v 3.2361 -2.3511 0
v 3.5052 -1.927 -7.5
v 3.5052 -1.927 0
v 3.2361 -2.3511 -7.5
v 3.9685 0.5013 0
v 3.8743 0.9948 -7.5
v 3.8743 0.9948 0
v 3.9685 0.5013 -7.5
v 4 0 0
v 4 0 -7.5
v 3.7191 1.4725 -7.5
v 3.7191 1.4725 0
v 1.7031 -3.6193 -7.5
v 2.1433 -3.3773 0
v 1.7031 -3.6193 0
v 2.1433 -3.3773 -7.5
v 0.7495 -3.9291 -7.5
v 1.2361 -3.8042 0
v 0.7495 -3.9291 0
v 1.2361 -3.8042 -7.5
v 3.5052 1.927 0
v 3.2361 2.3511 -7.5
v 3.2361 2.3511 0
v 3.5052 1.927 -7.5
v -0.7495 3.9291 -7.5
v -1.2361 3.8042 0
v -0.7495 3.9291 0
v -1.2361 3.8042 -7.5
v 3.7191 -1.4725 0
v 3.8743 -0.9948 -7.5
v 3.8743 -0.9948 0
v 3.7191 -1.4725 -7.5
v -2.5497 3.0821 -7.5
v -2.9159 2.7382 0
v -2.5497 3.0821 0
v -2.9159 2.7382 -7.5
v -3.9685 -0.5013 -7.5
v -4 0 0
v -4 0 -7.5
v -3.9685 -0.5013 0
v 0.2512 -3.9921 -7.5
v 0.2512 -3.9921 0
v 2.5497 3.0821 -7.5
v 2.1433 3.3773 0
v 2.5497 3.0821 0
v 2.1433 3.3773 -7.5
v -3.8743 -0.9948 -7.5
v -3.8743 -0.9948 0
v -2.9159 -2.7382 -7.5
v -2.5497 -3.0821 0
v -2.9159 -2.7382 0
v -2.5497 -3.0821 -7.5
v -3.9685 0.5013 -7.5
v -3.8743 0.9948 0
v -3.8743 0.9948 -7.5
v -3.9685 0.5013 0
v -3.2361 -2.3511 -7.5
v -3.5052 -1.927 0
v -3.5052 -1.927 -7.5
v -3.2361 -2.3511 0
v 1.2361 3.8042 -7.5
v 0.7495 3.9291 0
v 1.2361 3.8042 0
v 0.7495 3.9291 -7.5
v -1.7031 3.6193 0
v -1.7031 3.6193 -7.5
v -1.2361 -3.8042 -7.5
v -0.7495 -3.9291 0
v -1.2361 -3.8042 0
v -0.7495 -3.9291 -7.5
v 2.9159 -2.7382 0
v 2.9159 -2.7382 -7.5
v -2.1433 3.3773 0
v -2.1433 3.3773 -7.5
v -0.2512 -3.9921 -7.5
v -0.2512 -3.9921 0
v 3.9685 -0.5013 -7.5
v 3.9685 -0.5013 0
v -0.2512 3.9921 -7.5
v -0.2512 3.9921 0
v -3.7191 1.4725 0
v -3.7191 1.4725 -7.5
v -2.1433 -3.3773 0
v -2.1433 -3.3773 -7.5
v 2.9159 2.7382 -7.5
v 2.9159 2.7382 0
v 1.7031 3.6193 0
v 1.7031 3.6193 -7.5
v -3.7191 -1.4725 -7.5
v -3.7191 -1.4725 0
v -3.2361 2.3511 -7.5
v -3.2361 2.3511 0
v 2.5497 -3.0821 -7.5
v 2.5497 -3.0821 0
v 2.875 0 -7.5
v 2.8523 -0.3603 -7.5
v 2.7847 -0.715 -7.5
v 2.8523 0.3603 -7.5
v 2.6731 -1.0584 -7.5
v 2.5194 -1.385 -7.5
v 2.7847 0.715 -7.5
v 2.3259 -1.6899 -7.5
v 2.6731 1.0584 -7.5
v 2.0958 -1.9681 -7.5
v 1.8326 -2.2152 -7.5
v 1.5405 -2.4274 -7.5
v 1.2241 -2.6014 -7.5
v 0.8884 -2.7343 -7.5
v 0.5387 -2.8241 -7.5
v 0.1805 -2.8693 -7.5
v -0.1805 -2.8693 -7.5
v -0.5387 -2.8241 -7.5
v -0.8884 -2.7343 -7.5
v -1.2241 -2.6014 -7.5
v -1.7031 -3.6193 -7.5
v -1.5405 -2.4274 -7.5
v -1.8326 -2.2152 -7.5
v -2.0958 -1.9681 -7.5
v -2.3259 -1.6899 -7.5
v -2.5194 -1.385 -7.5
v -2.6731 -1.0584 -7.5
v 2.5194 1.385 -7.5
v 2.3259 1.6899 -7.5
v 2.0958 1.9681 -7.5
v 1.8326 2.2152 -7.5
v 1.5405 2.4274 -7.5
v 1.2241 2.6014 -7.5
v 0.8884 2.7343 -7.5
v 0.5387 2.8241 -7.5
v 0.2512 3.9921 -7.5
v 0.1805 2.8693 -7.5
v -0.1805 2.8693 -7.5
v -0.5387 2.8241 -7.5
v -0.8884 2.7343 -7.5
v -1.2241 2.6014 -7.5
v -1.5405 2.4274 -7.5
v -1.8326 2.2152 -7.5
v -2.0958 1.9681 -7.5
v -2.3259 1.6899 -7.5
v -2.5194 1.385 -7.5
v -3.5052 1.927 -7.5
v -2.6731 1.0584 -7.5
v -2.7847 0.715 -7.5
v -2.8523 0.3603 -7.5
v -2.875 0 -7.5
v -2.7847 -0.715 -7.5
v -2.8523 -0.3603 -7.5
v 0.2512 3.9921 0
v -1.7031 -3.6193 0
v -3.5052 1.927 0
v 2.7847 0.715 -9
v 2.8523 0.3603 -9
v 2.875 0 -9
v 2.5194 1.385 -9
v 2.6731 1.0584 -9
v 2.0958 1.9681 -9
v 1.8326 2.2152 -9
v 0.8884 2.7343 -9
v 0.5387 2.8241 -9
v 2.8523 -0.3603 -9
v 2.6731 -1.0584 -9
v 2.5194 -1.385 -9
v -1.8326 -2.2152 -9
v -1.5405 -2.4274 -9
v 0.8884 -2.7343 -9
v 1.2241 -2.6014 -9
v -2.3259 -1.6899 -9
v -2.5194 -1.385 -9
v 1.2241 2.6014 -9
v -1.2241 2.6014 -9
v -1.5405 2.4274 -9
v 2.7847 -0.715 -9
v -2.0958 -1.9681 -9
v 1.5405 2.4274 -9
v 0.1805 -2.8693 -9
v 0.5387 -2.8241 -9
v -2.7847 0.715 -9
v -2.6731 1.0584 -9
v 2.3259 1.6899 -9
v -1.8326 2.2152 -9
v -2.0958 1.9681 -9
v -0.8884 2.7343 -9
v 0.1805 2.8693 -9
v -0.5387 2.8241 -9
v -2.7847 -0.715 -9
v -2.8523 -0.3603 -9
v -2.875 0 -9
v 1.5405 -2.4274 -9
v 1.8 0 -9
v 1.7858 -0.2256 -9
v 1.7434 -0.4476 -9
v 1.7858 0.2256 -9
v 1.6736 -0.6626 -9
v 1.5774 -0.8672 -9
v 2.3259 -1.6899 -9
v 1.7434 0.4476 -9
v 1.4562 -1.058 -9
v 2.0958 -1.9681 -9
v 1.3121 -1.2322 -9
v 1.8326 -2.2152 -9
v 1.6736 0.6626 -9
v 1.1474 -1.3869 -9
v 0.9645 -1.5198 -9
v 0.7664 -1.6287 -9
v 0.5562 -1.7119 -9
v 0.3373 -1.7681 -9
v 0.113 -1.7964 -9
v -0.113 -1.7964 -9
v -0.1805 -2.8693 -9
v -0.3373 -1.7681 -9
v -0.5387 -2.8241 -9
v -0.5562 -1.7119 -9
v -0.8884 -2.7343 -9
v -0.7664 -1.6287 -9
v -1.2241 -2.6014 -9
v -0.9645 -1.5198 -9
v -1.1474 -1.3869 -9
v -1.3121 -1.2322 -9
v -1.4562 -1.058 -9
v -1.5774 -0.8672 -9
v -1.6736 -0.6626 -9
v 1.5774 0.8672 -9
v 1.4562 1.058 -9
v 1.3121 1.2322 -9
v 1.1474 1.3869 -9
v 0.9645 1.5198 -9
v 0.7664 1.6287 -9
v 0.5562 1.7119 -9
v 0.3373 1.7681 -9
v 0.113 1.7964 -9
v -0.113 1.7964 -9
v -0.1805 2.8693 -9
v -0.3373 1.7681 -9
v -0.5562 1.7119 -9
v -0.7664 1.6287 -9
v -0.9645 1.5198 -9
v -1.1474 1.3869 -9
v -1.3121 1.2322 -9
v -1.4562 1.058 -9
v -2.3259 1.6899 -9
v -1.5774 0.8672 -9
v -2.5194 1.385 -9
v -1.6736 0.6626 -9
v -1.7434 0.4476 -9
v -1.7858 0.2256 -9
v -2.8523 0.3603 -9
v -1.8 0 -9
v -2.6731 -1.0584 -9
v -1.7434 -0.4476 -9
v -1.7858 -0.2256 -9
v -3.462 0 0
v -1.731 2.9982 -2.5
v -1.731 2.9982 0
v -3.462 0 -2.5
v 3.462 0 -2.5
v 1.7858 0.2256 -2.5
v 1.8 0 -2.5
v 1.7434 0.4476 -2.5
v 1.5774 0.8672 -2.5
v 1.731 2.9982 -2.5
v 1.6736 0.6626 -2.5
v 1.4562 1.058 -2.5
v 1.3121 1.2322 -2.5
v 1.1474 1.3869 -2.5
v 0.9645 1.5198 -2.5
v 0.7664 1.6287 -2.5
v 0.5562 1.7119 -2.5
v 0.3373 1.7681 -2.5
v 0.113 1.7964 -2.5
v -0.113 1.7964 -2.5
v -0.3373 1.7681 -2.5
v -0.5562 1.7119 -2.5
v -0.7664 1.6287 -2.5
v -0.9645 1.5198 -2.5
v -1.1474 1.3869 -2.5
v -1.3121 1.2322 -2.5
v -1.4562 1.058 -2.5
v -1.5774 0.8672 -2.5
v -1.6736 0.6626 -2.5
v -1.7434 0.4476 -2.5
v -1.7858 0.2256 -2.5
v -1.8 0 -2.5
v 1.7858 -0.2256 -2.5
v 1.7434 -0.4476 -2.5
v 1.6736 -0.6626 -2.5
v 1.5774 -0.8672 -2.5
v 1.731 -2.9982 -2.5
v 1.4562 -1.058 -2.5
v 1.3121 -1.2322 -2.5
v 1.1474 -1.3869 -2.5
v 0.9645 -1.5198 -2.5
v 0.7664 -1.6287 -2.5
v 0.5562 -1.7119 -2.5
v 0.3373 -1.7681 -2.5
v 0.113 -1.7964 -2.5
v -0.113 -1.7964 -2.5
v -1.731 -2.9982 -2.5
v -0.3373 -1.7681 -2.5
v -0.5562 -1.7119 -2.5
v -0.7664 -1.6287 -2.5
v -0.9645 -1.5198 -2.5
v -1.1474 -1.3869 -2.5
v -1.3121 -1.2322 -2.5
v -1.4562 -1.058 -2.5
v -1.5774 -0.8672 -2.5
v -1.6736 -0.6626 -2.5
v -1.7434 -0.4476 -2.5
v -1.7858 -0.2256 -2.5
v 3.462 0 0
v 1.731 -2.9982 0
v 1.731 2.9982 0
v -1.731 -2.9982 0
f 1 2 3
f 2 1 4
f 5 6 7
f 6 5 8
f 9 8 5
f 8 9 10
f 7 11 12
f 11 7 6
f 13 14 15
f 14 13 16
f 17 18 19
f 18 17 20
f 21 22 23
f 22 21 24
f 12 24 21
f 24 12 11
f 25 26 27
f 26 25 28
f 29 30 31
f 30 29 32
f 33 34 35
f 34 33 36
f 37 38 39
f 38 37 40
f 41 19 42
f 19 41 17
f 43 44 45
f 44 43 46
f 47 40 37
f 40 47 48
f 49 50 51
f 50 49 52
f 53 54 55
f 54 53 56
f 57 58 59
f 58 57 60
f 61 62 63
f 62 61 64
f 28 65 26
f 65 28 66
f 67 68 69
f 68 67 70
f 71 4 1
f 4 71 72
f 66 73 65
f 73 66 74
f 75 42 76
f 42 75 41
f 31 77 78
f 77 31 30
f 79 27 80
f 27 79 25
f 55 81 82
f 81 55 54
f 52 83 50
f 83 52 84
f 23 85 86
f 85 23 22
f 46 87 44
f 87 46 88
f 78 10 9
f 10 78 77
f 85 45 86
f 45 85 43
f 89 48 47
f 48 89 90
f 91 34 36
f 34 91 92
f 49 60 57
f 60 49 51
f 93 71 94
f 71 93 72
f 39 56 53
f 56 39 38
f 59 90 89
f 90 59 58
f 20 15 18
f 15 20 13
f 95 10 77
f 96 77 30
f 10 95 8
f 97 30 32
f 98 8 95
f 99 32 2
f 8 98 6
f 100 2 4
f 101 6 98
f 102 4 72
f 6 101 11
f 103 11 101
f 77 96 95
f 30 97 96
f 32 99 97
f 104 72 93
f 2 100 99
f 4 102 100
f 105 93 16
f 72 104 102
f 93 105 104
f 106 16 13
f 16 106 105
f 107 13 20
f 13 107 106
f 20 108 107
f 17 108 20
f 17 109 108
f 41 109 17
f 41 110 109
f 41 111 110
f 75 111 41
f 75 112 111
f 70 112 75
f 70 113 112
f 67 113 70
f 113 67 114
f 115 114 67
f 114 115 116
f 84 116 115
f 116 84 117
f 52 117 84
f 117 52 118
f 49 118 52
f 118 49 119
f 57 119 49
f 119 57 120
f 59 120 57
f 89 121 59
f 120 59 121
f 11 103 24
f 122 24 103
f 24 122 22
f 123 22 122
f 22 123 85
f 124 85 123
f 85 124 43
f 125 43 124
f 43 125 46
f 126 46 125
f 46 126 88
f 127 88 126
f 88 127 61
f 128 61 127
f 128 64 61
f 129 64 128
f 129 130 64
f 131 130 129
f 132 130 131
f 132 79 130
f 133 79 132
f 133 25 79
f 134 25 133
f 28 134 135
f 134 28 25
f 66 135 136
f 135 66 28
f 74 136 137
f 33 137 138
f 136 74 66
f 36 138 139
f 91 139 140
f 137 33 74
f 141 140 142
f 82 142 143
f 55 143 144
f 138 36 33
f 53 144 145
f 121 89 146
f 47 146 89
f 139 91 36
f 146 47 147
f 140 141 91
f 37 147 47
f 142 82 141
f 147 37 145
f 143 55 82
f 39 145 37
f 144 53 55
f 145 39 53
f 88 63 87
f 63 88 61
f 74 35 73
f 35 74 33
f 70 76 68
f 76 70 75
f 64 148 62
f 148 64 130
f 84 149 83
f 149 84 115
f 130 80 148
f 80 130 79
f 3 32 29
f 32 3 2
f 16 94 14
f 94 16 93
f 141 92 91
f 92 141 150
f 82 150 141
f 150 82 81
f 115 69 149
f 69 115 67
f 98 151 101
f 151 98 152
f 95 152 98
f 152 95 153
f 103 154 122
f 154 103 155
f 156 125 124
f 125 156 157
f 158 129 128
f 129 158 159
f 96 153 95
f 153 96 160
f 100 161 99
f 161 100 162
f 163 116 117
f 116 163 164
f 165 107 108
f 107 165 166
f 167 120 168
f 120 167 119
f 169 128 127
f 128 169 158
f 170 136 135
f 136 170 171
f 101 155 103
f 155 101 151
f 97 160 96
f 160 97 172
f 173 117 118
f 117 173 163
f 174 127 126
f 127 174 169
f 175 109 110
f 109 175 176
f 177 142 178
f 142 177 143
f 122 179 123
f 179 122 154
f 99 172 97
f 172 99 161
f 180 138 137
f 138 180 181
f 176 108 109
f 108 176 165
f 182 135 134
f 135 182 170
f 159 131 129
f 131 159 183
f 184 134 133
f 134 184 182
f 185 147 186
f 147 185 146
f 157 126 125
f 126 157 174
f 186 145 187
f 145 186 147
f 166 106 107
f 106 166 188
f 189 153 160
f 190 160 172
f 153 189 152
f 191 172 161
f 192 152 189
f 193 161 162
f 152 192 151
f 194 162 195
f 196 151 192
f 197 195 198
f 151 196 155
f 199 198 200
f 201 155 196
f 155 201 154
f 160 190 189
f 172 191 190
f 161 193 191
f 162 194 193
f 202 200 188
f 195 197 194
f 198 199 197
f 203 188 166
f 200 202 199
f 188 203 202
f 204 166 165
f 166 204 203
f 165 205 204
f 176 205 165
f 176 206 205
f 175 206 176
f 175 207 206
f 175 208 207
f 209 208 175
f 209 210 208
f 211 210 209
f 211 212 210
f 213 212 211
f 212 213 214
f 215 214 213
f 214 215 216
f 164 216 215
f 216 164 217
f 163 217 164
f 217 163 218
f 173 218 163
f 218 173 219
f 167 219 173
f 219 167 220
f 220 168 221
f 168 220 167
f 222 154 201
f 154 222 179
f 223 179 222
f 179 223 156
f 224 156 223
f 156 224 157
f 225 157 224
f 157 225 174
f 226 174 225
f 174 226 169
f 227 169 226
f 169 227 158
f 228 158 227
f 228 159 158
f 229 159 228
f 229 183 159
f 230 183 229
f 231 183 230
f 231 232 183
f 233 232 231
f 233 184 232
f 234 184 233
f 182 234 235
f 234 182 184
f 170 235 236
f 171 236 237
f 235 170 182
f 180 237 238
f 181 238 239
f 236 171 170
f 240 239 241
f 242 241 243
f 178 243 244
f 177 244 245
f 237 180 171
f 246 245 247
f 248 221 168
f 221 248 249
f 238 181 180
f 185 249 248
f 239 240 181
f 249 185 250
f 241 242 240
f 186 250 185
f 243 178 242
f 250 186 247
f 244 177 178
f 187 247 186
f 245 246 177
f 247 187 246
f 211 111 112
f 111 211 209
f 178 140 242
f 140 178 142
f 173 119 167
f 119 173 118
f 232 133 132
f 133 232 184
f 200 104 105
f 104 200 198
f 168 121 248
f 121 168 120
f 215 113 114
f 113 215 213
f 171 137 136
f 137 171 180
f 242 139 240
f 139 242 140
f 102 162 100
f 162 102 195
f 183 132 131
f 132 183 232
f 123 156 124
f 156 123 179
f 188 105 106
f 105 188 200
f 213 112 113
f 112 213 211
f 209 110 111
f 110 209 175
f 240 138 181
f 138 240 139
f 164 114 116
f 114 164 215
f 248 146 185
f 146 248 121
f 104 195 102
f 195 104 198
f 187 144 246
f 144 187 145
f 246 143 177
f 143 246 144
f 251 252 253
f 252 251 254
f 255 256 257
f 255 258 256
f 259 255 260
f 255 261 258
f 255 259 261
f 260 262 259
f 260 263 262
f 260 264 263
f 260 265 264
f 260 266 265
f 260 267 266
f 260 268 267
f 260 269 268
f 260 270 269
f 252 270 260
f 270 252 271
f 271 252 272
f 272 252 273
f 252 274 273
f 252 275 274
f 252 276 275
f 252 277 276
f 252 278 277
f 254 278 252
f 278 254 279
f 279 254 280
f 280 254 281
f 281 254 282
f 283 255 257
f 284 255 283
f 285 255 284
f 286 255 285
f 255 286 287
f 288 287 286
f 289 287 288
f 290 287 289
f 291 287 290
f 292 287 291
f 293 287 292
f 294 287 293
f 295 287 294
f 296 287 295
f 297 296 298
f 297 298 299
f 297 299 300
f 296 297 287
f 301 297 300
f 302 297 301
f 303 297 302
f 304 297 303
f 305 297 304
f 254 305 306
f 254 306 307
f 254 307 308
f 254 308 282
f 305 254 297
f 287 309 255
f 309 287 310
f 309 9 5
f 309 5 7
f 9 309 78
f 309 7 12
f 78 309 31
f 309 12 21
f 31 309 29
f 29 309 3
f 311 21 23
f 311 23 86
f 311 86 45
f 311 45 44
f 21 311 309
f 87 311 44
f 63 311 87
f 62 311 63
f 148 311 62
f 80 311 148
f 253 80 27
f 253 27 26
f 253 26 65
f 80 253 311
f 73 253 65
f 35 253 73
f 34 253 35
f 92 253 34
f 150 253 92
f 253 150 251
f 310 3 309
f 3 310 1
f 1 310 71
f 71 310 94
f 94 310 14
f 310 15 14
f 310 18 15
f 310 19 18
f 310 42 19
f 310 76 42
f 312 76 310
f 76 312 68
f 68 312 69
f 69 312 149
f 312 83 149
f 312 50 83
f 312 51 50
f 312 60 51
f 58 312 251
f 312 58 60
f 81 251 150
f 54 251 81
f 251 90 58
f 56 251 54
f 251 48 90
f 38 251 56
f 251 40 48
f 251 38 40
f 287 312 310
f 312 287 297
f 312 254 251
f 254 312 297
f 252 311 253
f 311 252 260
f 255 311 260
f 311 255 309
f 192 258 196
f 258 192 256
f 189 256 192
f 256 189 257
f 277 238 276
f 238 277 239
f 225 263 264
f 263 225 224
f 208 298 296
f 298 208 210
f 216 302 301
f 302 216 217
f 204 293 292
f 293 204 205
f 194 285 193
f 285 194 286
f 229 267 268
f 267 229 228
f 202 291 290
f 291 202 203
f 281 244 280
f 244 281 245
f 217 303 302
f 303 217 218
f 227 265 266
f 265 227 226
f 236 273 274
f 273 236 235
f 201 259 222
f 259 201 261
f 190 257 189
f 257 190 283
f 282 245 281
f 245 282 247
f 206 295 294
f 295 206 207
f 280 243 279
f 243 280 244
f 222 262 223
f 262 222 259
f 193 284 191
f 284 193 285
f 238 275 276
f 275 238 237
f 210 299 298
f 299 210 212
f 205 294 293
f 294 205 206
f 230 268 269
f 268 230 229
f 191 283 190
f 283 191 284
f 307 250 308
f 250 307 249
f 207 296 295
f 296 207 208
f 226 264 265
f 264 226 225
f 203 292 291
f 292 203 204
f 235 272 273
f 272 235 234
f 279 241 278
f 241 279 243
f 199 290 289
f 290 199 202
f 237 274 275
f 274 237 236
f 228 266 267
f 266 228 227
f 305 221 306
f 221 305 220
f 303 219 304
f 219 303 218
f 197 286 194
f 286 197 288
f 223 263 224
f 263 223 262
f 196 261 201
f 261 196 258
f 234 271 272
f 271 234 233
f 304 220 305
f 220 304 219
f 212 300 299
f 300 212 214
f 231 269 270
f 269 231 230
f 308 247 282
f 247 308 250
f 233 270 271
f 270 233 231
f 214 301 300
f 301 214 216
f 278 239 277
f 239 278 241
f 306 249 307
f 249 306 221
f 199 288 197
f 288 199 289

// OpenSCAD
$fn = 50;

difference() {
	union() {
		translate(v = [0, 0, -7.5]) {
			cylinder(h = 10.5, r = 4.0);
		}
		#translate(v = [0, 0, -9.0]) {
			cylinder(h = 9, r = 2.875);
		}
	}
	union() {
		translate(v = [0, 0, 0]) {
			rotate(a = [0, 0, 0]) {
				difference() {
					union() {
						translate(v = [0, 0, -2.5]) {
							linear_extrude(height = 2.5) {
								polygon(points = [[3.4619999999999997, 0.0], [1.7310000000000003, 2.9981799479017264], [-1.7309999999999992, 2.9981799479017264], [-3.4619999999999997, 4.2397272186481365e-16], [-1.7310000000000014, -2.998179947901726], [1.7309999999999977, -2.9981799479017277]]);
							}
						}
					}
					union();
				}
			}
		}
		#cylinder(h = 3, r = 5.0);
		#translate(v = [0, 0, -100.0]) {
			cylinder(h = 200, r = 1.8);
		}
	}
}
